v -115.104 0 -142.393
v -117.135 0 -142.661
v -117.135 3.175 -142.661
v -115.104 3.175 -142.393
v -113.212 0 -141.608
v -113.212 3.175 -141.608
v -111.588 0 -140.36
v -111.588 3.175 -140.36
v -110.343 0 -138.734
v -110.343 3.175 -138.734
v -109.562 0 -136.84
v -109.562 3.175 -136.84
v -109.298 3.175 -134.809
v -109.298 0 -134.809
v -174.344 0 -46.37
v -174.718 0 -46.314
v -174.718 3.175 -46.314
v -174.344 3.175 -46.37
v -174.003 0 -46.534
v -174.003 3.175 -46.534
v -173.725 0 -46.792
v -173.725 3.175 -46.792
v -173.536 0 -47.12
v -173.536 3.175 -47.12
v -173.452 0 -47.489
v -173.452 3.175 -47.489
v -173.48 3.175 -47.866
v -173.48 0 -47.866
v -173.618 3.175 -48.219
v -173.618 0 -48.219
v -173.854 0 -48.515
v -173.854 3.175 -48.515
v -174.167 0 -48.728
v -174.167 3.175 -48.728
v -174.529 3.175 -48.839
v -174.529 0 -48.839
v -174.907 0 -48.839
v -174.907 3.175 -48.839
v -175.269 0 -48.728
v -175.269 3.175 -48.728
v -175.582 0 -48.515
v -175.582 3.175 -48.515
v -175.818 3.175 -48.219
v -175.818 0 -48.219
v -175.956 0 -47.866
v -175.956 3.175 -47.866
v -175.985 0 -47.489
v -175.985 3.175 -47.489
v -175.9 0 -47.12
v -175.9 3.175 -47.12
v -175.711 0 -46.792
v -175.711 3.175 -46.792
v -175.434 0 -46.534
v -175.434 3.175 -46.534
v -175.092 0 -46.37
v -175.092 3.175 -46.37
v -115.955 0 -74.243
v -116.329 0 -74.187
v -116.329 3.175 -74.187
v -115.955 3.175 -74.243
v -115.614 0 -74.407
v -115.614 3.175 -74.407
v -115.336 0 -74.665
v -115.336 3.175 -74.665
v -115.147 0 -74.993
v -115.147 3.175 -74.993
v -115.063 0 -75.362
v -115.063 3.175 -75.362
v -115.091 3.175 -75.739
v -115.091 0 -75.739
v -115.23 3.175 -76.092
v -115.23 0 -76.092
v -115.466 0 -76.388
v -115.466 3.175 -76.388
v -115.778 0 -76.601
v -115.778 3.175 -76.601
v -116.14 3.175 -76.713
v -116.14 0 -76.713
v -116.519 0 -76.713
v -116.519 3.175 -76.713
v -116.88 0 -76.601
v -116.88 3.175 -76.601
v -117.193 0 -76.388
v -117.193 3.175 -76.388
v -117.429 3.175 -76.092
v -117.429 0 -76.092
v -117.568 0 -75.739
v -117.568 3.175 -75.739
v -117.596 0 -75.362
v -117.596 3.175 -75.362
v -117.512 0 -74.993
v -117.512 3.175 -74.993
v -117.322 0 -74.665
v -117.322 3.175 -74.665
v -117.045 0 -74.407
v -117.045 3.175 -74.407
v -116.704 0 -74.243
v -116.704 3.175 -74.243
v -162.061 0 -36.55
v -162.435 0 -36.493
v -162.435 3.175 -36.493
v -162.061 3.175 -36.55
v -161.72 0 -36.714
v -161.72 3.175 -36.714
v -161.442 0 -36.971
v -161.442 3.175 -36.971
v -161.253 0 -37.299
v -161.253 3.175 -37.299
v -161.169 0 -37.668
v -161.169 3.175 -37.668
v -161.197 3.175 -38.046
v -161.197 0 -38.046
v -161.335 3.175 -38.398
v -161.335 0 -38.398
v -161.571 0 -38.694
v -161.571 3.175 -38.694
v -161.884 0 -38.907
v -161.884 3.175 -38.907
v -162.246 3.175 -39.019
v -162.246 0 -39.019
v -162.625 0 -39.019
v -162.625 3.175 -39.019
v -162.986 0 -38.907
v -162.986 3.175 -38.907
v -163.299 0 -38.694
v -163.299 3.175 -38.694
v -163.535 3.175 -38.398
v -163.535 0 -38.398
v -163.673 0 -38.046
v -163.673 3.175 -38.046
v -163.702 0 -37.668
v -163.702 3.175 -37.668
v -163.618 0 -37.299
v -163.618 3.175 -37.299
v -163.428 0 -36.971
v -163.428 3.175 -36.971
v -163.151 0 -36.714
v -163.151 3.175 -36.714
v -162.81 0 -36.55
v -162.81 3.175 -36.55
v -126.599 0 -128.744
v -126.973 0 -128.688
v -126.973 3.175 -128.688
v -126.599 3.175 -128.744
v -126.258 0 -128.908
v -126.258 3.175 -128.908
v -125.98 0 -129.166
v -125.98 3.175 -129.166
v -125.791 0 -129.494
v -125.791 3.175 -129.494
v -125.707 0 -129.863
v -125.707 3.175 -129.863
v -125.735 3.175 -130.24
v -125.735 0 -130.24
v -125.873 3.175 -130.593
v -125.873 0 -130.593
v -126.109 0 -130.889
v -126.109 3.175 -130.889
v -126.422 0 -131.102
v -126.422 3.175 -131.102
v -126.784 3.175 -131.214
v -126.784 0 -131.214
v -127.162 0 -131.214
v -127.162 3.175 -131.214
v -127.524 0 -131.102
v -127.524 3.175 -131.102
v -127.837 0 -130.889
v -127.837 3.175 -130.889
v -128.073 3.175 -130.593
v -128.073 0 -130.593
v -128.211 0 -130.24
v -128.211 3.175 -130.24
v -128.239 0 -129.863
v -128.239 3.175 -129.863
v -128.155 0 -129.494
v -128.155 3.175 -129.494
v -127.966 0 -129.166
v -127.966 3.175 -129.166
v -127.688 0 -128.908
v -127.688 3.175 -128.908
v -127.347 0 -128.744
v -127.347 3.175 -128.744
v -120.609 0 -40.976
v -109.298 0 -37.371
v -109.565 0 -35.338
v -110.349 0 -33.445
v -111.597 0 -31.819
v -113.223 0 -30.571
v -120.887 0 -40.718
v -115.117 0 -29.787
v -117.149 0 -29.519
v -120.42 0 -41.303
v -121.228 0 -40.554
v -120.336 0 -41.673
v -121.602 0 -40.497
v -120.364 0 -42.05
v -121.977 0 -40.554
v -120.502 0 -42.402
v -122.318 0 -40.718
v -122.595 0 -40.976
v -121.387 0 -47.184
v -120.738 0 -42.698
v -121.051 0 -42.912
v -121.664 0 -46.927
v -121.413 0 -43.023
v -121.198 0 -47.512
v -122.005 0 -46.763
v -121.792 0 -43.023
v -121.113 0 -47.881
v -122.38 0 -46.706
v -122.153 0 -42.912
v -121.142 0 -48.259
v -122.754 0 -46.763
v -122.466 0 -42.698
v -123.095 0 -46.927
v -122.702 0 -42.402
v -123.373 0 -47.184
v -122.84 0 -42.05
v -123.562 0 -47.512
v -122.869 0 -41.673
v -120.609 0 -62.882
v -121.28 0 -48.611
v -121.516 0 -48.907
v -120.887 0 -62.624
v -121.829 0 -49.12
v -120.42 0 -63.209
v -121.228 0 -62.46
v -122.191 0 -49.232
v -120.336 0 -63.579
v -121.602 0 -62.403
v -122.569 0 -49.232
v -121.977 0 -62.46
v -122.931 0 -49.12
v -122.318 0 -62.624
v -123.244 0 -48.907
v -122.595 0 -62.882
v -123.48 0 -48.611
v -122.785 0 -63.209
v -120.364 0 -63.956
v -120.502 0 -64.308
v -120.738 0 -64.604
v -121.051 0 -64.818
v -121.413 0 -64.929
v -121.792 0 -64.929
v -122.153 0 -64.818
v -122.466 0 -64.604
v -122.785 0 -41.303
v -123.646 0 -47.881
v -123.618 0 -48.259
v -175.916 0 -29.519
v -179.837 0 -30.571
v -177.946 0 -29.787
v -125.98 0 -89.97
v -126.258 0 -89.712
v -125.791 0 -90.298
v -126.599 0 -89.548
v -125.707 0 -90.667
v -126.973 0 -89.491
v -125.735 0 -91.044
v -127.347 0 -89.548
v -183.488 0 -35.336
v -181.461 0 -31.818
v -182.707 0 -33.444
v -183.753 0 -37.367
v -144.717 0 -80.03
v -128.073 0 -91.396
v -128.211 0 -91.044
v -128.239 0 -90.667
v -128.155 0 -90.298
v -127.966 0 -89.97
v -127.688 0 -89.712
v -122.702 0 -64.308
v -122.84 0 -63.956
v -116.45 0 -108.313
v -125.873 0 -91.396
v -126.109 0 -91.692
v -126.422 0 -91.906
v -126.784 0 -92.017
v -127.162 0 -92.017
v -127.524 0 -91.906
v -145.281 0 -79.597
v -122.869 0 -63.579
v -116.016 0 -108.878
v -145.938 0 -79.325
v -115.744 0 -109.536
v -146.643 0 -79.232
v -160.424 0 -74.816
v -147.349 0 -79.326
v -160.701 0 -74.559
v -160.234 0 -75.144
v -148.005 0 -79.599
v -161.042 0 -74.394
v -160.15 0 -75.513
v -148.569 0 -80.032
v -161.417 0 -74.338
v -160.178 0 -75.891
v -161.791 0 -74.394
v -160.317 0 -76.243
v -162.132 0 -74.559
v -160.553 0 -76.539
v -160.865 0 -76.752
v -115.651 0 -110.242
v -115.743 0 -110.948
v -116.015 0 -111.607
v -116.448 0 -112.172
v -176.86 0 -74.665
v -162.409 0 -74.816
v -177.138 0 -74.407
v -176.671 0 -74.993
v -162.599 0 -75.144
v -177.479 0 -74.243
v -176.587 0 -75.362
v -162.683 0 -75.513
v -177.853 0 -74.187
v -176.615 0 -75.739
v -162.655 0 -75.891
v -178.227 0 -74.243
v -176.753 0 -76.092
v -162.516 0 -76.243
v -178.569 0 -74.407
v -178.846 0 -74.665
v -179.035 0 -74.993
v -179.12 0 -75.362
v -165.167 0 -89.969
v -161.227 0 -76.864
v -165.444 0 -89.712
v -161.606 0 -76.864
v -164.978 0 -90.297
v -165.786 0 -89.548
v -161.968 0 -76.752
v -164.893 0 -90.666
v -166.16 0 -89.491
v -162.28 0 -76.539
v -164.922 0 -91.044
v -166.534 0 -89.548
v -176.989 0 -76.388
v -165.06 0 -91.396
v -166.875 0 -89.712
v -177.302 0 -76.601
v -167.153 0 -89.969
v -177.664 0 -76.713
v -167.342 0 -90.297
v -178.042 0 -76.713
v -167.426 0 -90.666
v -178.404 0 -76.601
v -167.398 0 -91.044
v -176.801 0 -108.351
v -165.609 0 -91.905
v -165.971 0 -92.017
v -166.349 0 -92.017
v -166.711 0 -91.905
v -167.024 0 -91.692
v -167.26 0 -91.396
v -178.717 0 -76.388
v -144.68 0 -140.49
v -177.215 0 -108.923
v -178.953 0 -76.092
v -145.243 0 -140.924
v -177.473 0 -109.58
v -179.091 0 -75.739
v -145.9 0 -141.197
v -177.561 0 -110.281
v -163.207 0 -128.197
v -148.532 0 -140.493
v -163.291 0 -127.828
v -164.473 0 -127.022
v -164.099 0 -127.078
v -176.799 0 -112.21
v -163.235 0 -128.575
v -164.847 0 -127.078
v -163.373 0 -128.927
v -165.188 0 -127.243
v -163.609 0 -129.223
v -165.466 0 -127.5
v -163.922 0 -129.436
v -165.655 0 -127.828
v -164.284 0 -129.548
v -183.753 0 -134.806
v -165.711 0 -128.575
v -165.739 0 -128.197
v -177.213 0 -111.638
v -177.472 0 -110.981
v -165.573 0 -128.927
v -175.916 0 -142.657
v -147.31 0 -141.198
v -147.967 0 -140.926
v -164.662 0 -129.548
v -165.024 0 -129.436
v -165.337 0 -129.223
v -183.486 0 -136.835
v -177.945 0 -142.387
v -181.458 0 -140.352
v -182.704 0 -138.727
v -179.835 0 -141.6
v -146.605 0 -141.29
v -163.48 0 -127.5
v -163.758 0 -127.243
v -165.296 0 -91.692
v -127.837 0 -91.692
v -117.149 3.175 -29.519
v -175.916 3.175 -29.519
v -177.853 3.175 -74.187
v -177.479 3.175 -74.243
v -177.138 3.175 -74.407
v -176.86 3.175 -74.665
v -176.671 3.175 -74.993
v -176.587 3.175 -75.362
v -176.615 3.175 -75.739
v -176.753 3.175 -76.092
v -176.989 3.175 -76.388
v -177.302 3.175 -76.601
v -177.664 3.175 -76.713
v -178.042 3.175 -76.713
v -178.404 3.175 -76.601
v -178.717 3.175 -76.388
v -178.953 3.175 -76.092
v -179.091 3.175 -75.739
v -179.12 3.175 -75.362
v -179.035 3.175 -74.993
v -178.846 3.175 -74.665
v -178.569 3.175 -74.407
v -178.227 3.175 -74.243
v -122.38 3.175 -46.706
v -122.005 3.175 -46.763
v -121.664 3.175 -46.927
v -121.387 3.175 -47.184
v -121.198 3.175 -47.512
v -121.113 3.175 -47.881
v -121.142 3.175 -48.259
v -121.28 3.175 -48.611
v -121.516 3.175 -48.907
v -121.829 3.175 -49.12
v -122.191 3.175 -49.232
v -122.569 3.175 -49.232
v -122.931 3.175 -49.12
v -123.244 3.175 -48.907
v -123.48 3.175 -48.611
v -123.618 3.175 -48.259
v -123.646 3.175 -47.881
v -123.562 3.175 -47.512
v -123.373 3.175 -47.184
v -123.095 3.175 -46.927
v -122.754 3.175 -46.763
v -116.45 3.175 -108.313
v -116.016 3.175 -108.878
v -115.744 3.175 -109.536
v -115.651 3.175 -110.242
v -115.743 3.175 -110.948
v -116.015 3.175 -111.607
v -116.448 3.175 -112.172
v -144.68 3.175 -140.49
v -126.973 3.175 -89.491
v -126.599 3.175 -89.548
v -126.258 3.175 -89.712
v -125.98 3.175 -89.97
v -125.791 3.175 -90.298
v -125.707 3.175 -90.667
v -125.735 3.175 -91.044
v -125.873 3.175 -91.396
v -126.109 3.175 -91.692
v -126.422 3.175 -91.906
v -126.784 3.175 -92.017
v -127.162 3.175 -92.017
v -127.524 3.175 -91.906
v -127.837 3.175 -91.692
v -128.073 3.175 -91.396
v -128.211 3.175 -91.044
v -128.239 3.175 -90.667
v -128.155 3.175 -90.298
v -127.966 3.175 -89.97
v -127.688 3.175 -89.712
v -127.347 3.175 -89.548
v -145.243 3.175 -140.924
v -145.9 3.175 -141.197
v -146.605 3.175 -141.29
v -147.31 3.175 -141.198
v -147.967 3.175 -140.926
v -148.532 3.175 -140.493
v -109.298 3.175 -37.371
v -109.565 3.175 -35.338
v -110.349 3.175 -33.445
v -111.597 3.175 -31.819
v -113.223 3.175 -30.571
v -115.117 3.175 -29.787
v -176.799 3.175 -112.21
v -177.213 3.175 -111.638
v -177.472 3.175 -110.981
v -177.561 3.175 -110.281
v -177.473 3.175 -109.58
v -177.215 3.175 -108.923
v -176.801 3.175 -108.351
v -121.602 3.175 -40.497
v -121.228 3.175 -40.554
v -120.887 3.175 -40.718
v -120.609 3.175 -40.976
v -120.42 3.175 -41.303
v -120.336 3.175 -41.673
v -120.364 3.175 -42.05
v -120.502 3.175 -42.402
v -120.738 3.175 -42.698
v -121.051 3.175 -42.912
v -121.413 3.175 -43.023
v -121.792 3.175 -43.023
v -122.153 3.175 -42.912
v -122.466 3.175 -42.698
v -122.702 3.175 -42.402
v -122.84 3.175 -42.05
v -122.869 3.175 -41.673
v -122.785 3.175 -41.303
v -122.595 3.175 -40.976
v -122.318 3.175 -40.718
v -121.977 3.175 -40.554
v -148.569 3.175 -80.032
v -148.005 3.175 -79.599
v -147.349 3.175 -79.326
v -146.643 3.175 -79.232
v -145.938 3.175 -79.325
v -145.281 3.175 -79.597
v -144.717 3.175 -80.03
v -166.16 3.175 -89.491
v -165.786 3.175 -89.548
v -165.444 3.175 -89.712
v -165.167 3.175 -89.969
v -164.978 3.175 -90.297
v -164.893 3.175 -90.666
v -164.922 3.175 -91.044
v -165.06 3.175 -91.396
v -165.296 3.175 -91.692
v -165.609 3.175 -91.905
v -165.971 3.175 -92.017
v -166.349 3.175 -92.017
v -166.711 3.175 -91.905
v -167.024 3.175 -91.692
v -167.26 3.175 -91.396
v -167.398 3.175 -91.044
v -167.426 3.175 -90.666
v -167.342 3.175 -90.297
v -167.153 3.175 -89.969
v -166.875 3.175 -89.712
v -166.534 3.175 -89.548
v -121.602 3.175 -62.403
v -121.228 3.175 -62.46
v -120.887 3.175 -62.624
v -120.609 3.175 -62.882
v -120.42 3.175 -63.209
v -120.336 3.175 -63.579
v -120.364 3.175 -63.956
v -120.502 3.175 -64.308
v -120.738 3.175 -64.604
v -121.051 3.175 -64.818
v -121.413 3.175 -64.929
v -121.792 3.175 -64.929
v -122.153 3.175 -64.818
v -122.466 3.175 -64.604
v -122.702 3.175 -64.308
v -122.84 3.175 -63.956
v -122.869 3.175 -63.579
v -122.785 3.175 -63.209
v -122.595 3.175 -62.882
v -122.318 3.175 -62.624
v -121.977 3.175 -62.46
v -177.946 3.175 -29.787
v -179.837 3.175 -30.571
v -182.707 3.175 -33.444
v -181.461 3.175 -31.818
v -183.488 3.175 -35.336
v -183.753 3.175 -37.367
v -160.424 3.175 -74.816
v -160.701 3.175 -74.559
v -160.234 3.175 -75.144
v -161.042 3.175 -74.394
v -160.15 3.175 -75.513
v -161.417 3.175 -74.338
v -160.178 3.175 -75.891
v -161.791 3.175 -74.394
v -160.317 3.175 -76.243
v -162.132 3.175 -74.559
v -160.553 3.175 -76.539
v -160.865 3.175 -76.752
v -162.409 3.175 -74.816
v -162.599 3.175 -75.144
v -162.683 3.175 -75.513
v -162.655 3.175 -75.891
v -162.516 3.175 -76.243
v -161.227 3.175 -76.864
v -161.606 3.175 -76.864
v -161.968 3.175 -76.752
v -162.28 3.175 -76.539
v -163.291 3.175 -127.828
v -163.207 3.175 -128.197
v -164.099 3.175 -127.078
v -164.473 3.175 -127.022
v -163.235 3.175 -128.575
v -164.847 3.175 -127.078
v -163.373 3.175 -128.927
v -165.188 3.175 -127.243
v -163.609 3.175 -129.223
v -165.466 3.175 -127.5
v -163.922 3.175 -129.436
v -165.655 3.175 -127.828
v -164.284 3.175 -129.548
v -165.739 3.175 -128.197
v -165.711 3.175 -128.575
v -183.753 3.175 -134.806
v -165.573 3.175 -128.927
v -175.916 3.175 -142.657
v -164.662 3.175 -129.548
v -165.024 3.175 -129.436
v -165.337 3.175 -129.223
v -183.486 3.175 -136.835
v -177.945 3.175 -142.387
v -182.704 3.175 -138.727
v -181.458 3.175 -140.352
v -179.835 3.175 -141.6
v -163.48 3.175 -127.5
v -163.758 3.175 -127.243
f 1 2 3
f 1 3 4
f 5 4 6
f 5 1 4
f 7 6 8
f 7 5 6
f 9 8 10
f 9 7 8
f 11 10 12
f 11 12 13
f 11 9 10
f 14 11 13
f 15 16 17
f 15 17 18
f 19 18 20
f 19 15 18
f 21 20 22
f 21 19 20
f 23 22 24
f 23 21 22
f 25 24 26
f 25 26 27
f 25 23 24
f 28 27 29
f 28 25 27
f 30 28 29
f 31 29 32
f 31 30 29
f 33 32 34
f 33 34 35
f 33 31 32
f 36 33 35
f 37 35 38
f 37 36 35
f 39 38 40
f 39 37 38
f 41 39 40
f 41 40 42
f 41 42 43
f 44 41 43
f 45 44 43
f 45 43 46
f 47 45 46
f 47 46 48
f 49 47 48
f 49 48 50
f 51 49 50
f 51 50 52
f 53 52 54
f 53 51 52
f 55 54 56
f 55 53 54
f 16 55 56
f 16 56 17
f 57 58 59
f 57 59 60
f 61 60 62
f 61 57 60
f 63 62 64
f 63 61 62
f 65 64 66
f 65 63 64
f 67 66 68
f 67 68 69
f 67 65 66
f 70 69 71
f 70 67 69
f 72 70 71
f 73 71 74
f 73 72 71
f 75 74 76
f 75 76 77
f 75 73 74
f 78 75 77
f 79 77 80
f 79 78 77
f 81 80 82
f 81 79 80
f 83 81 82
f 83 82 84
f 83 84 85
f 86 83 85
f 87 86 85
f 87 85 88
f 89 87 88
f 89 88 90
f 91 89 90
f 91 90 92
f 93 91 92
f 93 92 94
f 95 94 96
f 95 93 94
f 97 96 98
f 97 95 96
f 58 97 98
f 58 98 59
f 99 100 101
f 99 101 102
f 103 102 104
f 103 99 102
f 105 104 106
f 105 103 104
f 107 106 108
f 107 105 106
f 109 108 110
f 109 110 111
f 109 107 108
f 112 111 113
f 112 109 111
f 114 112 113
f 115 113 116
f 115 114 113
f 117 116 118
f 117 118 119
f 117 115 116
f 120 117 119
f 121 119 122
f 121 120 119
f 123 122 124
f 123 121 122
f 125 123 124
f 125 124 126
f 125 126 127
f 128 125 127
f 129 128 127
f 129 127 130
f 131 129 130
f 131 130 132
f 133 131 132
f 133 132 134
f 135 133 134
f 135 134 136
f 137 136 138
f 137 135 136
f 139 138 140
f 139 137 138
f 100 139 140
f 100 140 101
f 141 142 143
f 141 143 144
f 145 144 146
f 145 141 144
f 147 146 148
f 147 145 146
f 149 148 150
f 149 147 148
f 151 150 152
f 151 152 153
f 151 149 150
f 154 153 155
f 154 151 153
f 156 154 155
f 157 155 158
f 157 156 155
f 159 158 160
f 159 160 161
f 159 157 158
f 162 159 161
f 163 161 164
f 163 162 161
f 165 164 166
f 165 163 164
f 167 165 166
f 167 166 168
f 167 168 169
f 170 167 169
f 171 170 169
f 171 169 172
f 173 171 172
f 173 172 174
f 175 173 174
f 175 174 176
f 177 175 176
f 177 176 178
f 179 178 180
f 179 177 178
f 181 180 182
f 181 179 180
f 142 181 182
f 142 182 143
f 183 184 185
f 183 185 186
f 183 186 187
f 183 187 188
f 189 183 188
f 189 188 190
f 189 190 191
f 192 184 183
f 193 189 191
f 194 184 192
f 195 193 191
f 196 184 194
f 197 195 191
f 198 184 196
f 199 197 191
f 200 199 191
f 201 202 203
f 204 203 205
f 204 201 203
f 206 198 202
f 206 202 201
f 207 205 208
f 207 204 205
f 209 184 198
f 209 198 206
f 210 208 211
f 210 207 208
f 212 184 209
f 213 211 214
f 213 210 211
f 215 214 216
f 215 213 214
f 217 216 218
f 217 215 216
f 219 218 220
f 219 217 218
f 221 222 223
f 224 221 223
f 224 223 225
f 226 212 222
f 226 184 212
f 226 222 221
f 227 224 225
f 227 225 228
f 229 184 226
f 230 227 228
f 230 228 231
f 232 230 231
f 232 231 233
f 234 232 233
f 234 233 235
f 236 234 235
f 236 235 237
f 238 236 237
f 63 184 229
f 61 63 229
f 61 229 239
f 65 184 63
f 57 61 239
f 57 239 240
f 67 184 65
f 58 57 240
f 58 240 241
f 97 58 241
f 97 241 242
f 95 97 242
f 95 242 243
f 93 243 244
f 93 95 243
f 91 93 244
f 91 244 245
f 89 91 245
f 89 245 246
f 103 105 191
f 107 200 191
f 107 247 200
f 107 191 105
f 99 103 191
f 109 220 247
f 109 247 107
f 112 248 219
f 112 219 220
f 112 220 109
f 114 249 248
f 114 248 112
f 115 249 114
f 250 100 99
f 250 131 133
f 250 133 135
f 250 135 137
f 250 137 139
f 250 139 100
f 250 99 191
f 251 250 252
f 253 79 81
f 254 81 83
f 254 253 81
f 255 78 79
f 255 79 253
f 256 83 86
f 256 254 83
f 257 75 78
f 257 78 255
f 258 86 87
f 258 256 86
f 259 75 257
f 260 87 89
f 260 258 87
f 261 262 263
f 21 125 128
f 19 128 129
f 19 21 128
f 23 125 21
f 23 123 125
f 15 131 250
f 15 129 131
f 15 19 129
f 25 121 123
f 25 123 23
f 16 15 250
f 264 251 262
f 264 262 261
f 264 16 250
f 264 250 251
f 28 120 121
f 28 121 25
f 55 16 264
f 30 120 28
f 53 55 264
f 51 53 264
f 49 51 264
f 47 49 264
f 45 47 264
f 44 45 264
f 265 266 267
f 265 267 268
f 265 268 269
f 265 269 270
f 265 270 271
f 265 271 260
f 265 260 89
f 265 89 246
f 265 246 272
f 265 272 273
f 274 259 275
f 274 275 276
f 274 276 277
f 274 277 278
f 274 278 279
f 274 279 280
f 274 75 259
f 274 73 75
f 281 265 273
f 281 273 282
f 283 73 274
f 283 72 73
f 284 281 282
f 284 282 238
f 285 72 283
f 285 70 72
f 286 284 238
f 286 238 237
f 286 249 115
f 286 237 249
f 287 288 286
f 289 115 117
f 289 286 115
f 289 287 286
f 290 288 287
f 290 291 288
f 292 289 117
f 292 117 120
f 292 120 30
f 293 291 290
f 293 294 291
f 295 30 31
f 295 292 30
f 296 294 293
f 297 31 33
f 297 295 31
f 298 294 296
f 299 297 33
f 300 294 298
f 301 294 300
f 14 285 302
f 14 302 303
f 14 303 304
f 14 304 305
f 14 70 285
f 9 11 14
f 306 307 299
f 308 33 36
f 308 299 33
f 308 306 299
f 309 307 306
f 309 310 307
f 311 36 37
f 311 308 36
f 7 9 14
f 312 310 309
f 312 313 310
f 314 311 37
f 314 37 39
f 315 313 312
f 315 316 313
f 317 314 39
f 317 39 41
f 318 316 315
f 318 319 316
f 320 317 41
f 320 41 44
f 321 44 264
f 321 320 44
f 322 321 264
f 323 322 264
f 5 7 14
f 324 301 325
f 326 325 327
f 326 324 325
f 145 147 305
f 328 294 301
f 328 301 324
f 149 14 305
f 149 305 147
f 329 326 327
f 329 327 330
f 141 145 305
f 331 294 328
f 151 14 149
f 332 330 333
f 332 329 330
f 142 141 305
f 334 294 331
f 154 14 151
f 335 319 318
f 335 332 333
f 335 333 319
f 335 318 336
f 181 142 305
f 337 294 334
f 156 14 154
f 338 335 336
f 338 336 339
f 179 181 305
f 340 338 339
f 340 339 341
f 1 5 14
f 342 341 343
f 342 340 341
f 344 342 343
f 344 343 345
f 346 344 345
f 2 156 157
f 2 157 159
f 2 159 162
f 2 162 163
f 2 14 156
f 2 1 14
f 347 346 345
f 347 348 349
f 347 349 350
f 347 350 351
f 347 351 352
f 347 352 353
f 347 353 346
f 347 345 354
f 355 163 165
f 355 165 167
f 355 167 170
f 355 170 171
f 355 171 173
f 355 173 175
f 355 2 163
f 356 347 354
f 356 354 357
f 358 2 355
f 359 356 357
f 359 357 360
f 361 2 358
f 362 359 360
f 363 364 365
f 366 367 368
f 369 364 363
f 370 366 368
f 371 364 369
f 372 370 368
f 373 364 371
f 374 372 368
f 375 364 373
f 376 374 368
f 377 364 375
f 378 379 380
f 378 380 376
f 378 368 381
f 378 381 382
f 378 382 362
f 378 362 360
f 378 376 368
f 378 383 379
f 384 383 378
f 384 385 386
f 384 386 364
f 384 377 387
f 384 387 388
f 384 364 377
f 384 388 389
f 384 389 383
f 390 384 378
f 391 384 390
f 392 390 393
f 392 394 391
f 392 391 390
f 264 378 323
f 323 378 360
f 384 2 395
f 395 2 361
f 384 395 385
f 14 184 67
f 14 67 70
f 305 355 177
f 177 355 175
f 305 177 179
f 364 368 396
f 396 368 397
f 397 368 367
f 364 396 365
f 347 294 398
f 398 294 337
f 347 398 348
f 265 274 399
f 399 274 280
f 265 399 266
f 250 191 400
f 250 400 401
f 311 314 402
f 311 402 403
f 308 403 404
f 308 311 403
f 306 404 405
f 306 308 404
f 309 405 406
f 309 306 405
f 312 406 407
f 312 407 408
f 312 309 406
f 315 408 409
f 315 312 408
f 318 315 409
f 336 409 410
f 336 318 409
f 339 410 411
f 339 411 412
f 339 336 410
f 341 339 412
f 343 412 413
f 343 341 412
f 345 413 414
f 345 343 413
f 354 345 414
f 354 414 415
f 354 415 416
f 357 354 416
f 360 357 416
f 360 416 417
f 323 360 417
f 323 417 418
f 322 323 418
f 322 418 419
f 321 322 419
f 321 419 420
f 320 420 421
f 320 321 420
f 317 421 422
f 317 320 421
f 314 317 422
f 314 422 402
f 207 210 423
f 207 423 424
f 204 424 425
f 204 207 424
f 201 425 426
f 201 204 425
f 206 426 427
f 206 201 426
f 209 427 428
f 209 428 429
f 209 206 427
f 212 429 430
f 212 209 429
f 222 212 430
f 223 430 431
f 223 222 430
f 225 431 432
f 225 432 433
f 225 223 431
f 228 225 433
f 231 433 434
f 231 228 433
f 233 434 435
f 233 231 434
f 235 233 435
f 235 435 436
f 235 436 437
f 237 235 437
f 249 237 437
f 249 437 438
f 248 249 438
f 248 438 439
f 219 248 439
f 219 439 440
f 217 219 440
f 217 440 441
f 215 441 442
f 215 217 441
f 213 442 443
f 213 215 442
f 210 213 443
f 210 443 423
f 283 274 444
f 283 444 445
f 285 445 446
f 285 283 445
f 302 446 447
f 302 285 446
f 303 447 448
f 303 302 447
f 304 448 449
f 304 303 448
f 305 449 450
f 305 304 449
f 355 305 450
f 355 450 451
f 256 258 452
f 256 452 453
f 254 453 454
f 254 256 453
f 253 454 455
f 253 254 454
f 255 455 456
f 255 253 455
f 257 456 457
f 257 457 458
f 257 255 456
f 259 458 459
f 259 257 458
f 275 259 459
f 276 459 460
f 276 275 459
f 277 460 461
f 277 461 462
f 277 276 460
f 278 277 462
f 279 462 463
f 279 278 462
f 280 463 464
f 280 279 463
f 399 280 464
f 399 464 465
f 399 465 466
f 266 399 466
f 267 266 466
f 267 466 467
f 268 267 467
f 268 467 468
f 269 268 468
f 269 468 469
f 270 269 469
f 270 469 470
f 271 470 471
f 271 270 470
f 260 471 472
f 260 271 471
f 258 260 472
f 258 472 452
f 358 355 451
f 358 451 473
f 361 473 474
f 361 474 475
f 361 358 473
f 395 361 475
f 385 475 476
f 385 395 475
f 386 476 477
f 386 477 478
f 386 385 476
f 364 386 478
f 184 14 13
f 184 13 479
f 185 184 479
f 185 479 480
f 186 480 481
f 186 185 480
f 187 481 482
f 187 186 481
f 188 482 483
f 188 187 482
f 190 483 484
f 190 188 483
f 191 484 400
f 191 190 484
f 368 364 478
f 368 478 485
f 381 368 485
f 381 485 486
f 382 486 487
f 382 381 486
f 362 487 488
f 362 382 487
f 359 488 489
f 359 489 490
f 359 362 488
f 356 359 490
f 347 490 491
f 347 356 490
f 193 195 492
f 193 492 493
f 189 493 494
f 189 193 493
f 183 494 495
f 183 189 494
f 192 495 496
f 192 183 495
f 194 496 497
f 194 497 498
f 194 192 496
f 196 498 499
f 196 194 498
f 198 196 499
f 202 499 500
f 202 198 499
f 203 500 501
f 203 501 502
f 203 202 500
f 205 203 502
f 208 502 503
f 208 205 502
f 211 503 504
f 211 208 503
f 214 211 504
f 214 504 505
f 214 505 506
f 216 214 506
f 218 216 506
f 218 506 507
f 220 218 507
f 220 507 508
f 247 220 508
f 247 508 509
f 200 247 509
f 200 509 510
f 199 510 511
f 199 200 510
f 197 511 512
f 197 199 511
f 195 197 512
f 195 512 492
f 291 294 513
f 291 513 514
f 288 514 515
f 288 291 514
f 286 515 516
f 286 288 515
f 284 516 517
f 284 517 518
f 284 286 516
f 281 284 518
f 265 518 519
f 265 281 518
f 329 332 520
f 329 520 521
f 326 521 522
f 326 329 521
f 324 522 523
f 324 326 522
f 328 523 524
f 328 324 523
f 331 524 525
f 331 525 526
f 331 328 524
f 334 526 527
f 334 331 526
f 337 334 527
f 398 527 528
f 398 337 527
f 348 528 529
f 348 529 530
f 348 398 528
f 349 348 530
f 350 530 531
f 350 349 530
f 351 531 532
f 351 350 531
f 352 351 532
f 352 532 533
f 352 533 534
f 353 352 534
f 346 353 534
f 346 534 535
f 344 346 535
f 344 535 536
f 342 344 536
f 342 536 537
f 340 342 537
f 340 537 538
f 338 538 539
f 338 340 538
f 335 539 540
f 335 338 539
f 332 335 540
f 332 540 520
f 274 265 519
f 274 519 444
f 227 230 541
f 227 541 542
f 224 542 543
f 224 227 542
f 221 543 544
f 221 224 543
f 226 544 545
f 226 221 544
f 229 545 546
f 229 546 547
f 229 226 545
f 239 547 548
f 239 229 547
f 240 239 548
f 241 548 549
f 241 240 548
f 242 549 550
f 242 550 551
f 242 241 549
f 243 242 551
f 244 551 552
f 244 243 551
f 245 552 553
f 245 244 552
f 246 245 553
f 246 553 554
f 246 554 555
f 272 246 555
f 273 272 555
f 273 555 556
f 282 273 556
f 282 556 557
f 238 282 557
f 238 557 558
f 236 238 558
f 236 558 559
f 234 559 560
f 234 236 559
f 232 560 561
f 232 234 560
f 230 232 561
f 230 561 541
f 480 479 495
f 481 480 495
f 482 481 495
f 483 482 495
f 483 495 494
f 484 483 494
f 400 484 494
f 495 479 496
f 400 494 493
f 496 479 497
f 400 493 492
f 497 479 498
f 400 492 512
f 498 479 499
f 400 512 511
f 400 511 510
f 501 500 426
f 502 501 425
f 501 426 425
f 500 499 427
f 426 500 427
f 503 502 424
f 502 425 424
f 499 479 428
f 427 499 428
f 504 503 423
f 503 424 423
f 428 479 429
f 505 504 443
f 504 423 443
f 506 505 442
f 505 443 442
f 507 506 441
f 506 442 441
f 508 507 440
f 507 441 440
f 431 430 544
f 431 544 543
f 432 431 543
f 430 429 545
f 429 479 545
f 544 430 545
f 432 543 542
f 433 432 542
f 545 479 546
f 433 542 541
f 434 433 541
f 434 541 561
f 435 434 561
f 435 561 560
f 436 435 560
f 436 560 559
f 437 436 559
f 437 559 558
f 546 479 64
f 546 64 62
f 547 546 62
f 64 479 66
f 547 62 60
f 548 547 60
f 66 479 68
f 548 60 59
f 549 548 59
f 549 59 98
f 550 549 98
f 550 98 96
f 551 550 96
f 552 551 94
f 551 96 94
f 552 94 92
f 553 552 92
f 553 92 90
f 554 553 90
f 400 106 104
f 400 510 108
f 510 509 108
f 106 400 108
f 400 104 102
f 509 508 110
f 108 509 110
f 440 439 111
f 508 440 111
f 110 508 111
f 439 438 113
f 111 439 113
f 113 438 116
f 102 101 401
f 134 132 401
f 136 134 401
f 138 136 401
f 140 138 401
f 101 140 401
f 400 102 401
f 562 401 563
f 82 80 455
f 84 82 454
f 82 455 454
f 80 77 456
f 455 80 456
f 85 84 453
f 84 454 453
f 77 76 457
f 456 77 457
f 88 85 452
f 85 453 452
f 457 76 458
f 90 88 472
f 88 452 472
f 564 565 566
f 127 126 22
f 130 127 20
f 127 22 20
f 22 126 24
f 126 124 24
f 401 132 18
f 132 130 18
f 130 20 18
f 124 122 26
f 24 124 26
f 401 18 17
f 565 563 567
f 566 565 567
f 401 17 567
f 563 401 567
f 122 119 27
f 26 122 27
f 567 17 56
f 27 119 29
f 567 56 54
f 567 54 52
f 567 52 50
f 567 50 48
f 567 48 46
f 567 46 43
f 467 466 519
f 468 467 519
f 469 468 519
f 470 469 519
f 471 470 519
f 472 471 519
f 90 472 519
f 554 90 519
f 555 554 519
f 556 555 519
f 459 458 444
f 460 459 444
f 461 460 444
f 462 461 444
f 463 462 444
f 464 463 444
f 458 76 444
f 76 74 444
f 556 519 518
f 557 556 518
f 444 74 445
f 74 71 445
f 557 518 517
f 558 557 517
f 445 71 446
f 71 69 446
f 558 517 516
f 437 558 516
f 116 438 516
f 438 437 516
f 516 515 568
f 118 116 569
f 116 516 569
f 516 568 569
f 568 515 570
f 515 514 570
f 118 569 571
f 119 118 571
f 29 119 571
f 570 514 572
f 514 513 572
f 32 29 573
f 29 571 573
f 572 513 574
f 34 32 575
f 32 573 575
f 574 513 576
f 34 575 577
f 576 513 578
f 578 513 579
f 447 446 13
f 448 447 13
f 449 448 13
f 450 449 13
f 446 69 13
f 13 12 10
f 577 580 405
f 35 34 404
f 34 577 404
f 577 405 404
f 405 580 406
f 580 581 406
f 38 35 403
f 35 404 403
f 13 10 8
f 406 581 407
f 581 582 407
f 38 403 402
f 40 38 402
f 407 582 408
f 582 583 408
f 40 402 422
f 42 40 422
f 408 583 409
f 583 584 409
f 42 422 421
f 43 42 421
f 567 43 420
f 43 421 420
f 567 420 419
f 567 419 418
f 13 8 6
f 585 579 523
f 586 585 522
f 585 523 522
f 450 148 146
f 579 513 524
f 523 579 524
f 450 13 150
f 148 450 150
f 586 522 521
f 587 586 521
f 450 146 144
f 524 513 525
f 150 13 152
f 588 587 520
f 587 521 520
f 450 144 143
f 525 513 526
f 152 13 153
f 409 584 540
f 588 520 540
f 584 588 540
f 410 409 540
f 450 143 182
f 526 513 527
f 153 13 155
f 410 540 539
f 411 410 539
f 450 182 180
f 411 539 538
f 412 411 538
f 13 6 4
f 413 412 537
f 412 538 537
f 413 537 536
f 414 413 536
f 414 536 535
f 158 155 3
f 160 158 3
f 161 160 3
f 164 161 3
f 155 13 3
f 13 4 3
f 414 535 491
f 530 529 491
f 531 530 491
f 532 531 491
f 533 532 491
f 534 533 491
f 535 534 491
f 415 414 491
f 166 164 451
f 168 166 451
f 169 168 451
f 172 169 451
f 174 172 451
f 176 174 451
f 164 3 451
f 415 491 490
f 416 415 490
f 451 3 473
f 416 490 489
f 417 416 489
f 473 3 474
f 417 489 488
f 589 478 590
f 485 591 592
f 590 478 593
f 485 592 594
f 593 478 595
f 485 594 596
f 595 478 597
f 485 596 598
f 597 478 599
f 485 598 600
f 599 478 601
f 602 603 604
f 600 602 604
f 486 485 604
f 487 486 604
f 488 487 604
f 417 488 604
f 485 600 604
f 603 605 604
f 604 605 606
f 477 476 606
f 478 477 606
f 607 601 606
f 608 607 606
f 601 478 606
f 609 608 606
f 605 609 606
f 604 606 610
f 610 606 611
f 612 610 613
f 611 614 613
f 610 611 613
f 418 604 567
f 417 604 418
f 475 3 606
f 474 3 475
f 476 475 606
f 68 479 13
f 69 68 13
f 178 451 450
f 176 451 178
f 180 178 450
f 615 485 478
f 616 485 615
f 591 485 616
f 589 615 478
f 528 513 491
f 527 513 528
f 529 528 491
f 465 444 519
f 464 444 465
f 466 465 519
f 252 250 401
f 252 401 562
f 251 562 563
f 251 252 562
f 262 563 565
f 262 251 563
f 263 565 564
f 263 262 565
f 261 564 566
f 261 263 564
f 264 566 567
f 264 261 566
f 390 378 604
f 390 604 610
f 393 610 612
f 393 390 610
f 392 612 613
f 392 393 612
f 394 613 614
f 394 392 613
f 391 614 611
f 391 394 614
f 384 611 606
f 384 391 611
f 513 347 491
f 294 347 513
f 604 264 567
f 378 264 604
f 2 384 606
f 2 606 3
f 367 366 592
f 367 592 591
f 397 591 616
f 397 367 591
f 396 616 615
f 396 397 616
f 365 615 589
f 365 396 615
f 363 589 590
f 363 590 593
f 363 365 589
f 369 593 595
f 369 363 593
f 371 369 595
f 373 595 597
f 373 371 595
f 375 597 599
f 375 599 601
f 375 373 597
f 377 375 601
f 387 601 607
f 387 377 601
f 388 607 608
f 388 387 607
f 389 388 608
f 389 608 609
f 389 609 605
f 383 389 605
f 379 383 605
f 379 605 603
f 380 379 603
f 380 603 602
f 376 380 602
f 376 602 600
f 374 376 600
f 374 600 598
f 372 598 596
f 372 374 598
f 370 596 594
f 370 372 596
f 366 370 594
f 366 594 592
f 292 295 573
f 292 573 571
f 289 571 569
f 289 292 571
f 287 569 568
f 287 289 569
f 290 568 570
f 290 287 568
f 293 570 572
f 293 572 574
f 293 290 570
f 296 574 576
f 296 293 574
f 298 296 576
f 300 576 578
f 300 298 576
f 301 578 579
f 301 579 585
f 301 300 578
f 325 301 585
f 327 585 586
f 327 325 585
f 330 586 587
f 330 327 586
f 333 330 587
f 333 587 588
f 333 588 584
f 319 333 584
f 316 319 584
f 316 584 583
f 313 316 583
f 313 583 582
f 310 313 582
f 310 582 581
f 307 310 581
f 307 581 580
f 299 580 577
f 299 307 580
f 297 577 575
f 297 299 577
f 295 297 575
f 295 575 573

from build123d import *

# Parameters (mm, degrees)
SKETCH1_R           = 1.27
BOSS_EXTRUDE2_DEPTH = 3.175


with BuildPart() as part:
    # Sketch1 → Boss-Extrude2 (new body)
    with BuildSketch(Plane(origin=(0, 0, 0), x_dir=(1, 0, 0), z_dir=(0, 1, 0))):
        with BuildLine():
            ThreePointArc((-175.915621646, 29.519008442), (-181.461271413, 31.81826883), (-183.753097882, 37.366994908))
            Line((-183.753097882, 37.366994908), (-183.753097882, 134.805535228))
            ThreePointArc((-183.753097882, 134.805535228), (-181.458407426, 140.352437247), (-175.91562747, 142.657066645))
            Line((-175.91562747, 142.657066645), (-117.135020463, 142.660762281))
            ThreePointArc((-117.135020463, 142.660762281), (-111.588130828, 140.360246871), (-109.29759004, 134.809230866))
            Line((-109.29759004, 134.809230866), (-109.29759004, 37.37053719))
            ThreePointArc((-109.29759004, 37.37053719), (-111.597249567, 31.81866797), (-117.149118786, 29.519008442))
            Line((-117.149118786, 29.519008442), (-175.915621646, 29.519008442))
        make_face()
        with Locations(Location((-126.972959073, 129.95775743, 0), (0, 0, 270))):
            Circle(SKETCH1_R, mode=Mode.SUBTRACT)
        with Locations(Location((-164.472977249, 128.29201107, 0), (0, 0, 270))):
            Circle(SKETCH1_R, mode=Mode.SUBTRACT)
        with Locations(Location((-166.159897821, 90.761182378, 0), (0, 0, 270))):
            Circle(SKETCH1_R, mode=Mode.SUBTRACT)
        with Locations(Location((-126.972959075, 90.761489089, 0), (0, 0, 270))):
            Circle(SKETCH1_R, mode=Mode.SUBTRACT)
        with Locations(Location((-116.329373394, 75.456747577, 0), (0, 0, 270))):
            Circle(SKETCH1_R, mode=Mode.SUBTRACT)
        with Locations(Location((-121.602318573, 63.673415864, 0), (0, 0, 270))):
            Circle(SKETCH1_R, mode=Mode.SUBTRACT)
        with Locations(Location((-161.416515799, 75.608057078, 0), (0, 0, 270))):
            Circle(SKETCH1_R, mode=Mode.SUBTRACT)
        with Locations(Location((-177.85310358, 75.456747579, 0), (0, 0, 270))):
            Circle(SKETCH1_R, mode=Mode.SUBTRACT)
        with Locations(Location((-174.718127663, 47.58354115, 0), (0, 0, 270))):
            Circle(SKETCH1_R, mode=Mode.SUBTRACT)
        with Locations(Location((-122.379809257, 47.976111584, 0), (0, 0, 270))):
            Circle(SKETCH1_R, mode=Mode.SUBTRACT)
        with Locations(Location((-121.602318574, 41.767430359, 0), (0, 0, 270))):
            Circle(SKETCH1_R, mode=Mode.SUBTRACT)
        with Locations(Location((-162.435290361, 37.763153633, 0), (0, 0, 270))):
            Circle(SKETCH1_R, mode=Mode.SUBTRACT)
        with BuildLine():
            ThreePointArc((-144.679570761, 140.490425994), (-146.605093484, 141.290423511), (-148.531606371, 140.492813408))
            Line((-148.531606371, 140.492813408), (-176.798615575, 112.209681509))
            ThreePointArc((-176.798615575, 112.209681509), (-177.56091066, 110.280604208), (-176.801172002, 108.350518665))
            Line((-176.801172002, 108.350518665), (-148.569167296, 80.0322861))
            ThreePointArc((-148.569167296, 80.0322861), (-146.643487849, 79.232224846), (-144.71682032, 80.029903714))
            Line((-144.71682032, 80.029903714), (-116.449969407, 108.313038257))
            ThreePointArc((-116.449969407, 108.313038257), (-115.650538135, 110.242134618), (-116.447583058, 112.172218171))
            Line((-116.447583058, 112.172218171), (-144.679570761, 140.490425994))
        make_face(mode=Mode.SUBTRACT)
    extrude(amount=BOSS_EXTRUDE2_DEPTH)


solid = part.part
